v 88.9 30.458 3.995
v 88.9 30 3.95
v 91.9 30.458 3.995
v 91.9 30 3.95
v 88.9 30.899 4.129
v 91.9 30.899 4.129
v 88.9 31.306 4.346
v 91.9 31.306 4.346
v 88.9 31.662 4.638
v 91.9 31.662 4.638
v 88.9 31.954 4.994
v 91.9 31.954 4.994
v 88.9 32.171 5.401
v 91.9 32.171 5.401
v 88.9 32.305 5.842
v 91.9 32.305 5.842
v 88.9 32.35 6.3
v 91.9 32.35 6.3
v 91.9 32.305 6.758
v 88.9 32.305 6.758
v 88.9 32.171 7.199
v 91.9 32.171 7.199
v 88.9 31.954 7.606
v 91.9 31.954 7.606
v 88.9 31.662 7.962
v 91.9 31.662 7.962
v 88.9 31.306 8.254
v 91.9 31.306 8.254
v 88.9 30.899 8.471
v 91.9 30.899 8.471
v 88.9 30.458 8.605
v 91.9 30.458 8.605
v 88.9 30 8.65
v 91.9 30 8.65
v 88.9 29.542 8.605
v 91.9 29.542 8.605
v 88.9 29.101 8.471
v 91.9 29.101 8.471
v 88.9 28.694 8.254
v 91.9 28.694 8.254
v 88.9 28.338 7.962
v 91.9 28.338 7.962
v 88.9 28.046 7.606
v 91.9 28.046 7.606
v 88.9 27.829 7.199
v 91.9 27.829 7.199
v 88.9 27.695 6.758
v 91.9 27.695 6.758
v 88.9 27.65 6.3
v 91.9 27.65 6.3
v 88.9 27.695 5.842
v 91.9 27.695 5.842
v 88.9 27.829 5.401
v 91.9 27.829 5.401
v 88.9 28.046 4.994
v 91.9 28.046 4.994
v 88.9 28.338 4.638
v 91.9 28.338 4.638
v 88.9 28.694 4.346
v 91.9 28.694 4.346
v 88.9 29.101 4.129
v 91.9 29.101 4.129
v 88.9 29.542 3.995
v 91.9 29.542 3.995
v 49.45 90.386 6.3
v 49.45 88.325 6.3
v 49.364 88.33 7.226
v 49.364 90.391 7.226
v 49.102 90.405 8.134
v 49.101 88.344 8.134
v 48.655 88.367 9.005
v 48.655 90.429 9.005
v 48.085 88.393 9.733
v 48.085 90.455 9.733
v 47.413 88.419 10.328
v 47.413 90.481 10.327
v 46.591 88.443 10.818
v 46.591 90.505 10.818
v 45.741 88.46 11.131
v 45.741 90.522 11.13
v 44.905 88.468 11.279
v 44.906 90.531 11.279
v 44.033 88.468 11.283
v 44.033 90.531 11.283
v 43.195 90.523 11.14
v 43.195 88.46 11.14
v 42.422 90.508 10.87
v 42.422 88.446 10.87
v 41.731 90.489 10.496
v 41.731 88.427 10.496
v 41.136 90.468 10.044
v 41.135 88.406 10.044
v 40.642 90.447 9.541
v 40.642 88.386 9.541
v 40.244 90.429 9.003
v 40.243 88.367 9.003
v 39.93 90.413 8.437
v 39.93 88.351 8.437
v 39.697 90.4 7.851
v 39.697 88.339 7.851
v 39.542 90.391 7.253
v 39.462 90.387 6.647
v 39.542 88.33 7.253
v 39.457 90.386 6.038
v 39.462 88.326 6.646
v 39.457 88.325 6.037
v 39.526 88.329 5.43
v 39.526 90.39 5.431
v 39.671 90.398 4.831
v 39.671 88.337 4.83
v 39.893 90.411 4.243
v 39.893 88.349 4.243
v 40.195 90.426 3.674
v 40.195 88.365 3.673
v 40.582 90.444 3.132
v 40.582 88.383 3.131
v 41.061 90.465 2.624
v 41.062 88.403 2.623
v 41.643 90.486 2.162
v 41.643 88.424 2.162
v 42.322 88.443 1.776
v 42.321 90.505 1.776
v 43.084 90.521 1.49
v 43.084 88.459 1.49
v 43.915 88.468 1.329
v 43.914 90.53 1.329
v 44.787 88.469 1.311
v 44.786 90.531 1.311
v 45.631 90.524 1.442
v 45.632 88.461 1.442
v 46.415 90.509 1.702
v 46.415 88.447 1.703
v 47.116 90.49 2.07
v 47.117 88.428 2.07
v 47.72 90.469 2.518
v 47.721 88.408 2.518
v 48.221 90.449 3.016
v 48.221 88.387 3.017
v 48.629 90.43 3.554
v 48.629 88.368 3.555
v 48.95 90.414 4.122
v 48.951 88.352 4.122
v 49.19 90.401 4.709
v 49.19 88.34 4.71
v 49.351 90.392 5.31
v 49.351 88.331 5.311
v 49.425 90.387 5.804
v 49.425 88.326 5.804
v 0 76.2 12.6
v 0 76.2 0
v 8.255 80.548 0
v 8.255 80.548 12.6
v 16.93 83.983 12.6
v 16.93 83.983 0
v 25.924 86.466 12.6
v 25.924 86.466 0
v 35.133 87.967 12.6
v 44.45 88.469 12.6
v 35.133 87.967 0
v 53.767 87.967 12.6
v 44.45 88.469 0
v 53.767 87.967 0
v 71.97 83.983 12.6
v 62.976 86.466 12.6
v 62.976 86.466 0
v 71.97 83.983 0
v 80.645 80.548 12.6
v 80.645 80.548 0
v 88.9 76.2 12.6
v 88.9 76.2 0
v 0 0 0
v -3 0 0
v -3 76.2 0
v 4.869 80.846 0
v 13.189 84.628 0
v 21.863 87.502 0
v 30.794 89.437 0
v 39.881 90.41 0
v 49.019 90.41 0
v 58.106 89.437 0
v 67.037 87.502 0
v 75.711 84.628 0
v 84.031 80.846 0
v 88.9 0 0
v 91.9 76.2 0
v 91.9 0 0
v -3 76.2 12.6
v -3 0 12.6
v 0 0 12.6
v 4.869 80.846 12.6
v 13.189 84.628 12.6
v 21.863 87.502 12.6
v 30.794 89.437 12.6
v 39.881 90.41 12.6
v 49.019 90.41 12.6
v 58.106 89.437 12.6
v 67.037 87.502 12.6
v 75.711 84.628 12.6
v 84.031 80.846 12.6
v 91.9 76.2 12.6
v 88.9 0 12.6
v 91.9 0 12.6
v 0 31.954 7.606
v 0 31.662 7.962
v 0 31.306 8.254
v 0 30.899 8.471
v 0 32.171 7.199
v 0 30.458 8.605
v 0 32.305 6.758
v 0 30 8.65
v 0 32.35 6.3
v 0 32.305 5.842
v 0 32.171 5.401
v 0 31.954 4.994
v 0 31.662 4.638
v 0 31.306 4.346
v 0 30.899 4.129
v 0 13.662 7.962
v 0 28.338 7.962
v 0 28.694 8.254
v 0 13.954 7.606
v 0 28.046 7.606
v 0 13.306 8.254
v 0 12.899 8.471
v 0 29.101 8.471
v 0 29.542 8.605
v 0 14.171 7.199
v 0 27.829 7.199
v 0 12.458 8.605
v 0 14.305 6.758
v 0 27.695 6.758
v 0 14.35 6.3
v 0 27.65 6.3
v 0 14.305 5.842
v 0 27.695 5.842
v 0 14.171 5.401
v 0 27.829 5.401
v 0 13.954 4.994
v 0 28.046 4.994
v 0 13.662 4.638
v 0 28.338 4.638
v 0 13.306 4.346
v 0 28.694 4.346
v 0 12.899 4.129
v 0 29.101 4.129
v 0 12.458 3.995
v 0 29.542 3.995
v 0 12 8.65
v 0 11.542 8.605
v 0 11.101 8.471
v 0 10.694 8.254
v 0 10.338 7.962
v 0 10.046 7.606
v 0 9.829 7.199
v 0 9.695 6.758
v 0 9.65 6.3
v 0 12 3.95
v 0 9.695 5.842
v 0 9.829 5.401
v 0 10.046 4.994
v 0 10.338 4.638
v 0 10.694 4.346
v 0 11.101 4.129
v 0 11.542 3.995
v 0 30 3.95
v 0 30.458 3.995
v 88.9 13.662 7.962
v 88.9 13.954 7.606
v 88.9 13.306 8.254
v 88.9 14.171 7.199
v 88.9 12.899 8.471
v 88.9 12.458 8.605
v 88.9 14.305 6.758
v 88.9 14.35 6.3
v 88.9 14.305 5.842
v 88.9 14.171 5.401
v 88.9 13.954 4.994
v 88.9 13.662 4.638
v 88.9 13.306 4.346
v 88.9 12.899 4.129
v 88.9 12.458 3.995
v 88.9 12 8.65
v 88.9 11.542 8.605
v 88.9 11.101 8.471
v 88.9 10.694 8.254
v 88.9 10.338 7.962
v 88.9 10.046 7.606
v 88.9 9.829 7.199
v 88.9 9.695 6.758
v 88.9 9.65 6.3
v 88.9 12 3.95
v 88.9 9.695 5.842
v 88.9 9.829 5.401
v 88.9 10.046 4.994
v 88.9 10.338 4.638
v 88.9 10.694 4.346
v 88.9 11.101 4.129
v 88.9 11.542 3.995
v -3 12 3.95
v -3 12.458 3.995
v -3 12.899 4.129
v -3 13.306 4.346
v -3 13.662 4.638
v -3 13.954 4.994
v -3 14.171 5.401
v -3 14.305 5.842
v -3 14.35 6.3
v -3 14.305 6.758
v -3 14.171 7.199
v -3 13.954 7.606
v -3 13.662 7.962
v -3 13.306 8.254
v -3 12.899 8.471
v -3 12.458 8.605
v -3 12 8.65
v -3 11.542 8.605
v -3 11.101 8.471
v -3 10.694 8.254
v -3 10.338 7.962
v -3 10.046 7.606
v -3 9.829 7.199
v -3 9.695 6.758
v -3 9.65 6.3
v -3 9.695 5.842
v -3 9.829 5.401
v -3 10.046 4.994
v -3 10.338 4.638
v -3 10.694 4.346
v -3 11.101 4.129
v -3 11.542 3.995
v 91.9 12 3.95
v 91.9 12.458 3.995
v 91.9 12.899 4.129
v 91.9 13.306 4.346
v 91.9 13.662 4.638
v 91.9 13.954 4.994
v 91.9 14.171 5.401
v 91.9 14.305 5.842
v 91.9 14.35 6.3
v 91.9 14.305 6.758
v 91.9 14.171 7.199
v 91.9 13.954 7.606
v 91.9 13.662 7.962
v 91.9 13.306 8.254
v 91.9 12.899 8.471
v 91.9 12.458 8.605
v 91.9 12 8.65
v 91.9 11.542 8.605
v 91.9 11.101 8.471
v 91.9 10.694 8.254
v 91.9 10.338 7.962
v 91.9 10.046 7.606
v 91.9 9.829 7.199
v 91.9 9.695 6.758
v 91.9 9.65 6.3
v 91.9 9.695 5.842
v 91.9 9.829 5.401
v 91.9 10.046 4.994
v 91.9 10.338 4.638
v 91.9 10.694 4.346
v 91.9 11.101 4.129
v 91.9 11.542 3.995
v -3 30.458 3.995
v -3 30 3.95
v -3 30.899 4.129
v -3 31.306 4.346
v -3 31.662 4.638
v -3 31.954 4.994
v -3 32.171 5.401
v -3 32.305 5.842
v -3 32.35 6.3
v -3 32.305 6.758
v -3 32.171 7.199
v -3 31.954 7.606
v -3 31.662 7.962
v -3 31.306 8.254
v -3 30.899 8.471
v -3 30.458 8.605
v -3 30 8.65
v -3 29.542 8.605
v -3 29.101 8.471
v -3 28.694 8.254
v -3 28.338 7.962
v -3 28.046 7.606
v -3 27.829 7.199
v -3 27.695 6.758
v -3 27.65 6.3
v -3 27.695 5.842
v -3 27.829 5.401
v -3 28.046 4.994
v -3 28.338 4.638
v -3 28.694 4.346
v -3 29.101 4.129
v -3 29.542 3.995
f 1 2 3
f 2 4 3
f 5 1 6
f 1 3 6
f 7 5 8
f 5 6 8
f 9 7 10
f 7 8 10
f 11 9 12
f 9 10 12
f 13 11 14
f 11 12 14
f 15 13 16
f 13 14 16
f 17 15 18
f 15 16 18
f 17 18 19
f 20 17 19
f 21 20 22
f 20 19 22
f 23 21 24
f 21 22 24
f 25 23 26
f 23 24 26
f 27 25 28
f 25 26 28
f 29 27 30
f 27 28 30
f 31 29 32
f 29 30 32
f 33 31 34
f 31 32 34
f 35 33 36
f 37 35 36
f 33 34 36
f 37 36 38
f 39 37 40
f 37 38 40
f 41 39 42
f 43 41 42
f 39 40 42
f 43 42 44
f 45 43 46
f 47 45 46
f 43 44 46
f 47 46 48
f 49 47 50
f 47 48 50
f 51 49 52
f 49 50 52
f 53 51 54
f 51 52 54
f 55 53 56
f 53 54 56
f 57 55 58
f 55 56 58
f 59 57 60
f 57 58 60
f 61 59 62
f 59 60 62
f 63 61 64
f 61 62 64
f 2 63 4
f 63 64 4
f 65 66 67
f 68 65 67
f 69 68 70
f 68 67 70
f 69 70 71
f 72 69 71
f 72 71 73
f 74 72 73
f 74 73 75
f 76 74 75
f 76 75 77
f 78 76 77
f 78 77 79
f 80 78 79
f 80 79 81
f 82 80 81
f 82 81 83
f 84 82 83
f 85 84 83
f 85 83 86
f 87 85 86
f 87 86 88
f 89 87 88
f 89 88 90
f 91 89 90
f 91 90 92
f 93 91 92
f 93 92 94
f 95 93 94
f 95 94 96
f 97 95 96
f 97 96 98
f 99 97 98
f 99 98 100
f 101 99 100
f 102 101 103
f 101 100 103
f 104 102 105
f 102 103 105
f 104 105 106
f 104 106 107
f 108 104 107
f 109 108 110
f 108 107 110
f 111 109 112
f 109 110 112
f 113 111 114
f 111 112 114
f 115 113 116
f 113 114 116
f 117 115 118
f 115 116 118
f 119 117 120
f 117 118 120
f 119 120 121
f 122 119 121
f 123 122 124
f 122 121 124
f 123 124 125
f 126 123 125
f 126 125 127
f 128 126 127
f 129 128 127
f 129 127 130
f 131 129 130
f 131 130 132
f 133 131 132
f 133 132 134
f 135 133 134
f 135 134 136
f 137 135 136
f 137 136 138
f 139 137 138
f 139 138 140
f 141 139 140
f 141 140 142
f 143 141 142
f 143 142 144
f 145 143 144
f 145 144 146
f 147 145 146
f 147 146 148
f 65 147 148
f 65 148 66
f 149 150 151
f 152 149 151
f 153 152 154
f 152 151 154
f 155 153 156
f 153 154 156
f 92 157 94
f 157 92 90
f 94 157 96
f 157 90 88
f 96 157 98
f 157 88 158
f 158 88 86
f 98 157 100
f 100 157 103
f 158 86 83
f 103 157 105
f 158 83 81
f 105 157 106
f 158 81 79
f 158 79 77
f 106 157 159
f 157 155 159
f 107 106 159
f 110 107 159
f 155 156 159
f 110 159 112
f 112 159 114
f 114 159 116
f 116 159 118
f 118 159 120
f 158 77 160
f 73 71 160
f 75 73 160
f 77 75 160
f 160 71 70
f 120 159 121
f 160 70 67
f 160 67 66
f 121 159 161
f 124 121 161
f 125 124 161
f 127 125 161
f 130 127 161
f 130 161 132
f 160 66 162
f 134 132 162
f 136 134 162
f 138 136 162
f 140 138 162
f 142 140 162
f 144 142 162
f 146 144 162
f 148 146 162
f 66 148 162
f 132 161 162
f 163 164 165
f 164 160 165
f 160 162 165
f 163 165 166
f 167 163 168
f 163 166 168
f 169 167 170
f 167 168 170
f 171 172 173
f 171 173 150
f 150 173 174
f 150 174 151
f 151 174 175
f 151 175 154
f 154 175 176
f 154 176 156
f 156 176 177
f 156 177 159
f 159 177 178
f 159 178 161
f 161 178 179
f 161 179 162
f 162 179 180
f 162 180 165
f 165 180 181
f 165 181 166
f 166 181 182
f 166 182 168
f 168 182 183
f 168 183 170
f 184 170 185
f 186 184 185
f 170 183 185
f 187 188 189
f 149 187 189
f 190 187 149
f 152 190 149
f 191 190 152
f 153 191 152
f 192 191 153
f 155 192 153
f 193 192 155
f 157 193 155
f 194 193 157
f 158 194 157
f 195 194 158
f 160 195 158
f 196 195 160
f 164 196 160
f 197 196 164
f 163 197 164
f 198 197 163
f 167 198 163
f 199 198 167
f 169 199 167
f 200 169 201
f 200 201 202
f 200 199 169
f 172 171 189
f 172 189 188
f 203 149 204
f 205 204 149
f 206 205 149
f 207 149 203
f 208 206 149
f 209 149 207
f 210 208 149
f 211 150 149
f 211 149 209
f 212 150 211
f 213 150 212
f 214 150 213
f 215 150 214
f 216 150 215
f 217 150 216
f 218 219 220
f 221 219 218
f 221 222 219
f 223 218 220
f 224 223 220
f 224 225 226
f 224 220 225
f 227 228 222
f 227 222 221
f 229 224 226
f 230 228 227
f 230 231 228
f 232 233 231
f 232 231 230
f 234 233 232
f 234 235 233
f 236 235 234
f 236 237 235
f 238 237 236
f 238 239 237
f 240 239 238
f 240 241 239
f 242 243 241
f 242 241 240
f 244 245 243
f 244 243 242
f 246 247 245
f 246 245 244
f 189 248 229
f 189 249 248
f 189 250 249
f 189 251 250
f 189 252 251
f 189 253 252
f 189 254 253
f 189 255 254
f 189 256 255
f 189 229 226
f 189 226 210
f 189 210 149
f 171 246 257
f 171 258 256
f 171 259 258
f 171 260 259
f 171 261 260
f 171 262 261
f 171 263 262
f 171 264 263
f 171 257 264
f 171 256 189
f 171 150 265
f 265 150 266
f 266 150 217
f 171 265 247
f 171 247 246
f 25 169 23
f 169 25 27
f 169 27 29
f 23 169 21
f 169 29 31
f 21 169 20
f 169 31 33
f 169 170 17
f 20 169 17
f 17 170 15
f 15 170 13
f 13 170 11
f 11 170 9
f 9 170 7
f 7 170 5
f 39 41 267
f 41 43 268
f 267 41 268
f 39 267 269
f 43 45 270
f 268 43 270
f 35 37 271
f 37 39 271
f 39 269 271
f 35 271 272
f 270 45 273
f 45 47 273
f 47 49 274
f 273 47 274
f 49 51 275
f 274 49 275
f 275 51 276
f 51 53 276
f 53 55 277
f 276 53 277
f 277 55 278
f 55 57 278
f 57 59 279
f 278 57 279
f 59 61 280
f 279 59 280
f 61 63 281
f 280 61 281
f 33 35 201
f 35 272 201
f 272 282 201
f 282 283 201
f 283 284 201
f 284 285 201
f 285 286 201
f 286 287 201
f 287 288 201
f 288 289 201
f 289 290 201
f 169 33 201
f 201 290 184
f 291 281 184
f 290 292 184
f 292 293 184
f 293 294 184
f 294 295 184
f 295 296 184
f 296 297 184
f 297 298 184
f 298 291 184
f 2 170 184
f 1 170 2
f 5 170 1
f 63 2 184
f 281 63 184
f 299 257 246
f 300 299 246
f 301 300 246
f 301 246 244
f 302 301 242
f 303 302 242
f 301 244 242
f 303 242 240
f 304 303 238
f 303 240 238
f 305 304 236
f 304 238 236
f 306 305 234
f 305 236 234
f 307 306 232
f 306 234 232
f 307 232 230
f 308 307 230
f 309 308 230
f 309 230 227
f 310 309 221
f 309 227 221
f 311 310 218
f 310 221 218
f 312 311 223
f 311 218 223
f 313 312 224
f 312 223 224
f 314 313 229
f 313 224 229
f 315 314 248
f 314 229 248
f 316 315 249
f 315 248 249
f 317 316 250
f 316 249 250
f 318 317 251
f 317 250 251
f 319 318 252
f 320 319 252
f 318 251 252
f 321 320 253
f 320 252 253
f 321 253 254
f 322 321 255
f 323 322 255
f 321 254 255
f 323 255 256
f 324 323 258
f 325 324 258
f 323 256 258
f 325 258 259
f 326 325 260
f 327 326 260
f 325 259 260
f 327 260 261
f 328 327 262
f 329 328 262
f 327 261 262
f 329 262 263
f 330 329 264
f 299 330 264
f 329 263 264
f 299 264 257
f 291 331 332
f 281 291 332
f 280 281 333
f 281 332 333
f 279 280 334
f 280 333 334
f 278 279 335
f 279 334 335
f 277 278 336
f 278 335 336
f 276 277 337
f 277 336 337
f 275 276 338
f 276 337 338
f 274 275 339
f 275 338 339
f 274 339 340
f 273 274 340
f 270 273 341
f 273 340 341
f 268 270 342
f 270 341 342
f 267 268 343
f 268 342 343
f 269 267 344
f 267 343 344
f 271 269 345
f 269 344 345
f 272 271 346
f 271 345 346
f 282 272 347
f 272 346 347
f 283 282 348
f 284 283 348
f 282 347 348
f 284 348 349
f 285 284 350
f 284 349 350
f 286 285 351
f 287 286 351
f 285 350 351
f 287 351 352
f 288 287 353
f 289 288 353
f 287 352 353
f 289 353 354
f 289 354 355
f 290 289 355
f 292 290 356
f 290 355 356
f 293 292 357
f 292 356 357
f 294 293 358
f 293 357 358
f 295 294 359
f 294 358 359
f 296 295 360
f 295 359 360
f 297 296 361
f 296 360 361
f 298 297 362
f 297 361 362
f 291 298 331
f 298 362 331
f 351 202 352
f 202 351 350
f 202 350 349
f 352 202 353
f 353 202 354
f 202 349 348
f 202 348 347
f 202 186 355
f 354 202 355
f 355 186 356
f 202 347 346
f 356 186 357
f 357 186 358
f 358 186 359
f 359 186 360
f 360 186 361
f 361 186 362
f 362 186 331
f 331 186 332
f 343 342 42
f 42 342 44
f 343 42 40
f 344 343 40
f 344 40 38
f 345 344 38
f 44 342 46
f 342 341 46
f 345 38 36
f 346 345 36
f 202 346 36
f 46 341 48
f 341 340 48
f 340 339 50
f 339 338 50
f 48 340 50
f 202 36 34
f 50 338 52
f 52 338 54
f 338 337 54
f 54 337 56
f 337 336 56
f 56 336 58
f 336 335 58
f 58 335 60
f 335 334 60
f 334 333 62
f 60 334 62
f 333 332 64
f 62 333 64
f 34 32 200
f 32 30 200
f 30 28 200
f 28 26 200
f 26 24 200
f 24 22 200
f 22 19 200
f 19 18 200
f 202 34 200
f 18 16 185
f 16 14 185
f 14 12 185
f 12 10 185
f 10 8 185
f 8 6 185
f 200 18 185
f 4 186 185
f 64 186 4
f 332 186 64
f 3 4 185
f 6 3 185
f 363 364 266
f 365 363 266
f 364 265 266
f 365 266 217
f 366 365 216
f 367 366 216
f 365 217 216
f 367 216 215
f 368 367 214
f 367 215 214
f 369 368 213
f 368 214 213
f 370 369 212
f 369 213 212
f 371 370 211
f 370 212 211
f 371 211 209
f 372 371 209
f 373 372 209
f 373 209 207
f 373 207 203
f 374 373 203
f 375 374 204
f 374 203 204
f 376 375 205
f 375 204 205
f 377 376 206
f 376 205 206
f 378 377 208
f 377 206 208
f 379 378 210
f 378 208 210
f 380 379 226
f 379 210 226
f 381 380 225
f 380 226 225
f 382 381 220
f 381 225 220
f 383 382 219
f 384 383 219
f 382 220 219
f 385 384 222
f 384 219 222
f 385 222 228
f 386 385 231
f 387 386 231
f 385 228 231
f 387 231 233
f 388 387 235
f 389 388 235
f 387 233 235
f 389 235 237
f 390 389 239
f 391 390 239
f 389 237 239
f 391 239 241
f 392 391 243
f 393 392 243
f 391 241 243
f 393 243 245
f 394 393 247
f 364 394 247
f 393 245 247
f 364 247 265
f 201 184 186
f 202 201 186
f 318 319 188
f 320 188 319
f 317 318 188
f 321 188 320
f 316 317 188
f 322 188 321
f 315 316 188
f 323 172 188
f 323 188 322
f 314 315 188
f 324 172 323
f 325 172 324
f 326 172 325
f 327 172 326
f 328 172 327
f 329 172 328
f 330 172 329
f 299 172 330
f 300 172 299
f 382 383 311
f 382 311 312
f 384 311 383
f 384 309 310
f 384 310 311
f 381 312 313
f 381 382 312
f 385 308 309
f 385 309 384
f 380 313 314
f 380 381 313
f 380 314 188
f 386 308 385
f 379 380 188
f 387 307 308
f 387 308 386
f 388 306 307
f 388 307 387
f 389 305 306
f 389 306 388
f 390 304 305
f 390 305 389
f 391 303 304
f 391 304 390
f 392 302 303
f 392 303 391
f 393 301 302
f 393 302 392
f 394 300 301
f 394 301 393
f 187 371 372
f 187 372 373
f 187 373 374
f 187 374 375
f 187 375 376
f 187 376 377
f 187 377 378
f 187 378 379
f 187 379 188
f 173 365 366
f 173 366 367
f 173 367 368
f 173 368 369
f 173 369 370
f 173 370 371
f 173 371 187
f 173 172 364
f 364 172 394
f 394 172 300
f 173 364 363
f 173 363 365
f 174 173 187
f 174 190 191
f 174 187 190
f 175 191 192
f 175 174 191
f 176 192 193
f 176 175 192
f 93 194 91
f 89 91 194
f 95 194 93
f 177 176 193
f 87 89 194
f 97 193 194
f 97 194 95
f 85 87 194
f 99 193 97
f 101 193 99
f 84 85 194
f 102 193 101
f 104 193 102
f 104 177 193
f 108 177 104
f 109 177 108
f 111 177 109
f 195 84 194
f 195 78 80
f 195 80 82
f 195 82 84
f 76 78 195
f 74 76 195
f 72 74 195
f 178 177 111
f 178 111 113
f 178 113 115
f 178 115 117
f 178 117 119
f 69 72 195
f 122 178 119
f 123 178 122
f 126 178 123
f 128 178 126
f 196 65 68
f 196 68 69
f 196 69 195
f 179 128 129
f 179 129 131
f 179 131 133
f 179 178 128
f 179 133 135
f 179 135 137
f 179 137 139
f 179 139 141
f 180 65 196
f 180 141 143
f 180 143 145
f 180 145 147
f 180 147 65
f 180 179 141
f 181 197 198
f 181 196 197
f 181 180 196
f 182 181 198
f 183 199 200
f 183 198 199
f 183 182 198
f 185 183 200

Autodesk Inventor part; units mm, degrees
ref_plane "YZ Plane" through (0, 0, 0) normal (1, 0, 0) x (0, 1, 0)
ref_plane "XZ Plane" through (0, 0, 0) normal (0, 1, 0) x (-1, 0, 0)
sketch "Sketch1" plane through (0, 0, 0) normal (0, 0, 1) x (1, 0, 0)
  line L0 (0, 0) -> (88.9, 0)
  line L1 (0, 0) -> (-0.8653, 0)
  line L2 (88.9, 0) -> (18.4478, 0)
  line L3 (88.9, 22.8434) -> (88.9, 0)
  line L4 (0, 0) -> (-3, 0)
  line L5 (-3, 0) -> (-3, 76.2)
  line L6 (-3, 76.2) -> (0, 76.2)
  line L7 (0, 76.2) -> (0, 0)
  line L8 (88.9, 0) -> (91.9, 0)
  line L9 (91.9, 0) -> (91.9, 76.2)
  line L10 (91.9, 76.2) -> (88.9, 76.2)
  line L11 (88.9, 76.2) -> (88.9, 0)
  arc A0 (88.9, 76.2) -> (0, 76.2) centre (44.45, 1.8166) ccw
  arc A1 (91.9, 76.2) -> (-3, 76.2) centre (44.45, 4.8166) ccw
  dimension "d8" = 3
  dimension "d9" = 76.2
  dimension "d10" = 88.9
  dimension "d11" = 3
  dimension "d12" = 3
extrude "Extrusion1" add sketch "Sketch1" along normal blind 12.6 contours L1 L4 L5 L6 L7 | L6 A1 L10 A0 | L3 L11 L10 L9 L8
sketch "Sketch2" plane through (91.9, 0, 0) normal (1, 0, 0) x (0, 0, -1)
  line L0 (0, 0) -> (-6.3, 0)
  line L1 (-6.3, 0) -> (-6.3, 30)
  line L2 (-6.3, 30) -> (0, 30)
  line L3 (0, 30) -> (0, 0)
  circle A0 centre (-6.3, 30) radius 2.35
  circle A1 centre (-6.3, 12) radius 2.35
  dimension "d15" = 30
  dimension "d16" = 6.3
  dimension "d17" = 4.7
  dimension "d18" = 4.7
  dimension "d19" = 18
  dimension "d26" = 12
extrude "Extrusion2" cut sketch "Sketch2" against normal through all contours A1 L1 | L1 A1 | A0 L1 L2 | L2 L1 A0
ref_plane "Work Plane1" through (44.45, -80.8985, 0) normal (0, -1, 0) x (1, 0, 0)
sketch "Sketch3" plane through (44.45, -80.8985, 0) normal (0, -1, 0) x (1, 0, 0)
  line L0 (47.45, 0) -> (-47.45, 0) projected
  line L1 (-47.45, 0) -> (0, 0)
  line L2 (0, 0) -> (0, 6.3)
  line L3 (0, 6.3) -> (-47.45, 6.3)
  line L4 (-47.45, 6.3) -> (-47.45, 0)
  circle A0 centre (0, 6.3) radius 5
  point P0 (-44.45, 0)
  dimension "d22" = 6.3
  dimension "d23" = 10
extrude "Extrusion3" cut sketch "Sketch3" against normal through all contours A0 L3 L2 | L2 L3 A0
properties part number "pulleybracket" material "Iron, Cast"
